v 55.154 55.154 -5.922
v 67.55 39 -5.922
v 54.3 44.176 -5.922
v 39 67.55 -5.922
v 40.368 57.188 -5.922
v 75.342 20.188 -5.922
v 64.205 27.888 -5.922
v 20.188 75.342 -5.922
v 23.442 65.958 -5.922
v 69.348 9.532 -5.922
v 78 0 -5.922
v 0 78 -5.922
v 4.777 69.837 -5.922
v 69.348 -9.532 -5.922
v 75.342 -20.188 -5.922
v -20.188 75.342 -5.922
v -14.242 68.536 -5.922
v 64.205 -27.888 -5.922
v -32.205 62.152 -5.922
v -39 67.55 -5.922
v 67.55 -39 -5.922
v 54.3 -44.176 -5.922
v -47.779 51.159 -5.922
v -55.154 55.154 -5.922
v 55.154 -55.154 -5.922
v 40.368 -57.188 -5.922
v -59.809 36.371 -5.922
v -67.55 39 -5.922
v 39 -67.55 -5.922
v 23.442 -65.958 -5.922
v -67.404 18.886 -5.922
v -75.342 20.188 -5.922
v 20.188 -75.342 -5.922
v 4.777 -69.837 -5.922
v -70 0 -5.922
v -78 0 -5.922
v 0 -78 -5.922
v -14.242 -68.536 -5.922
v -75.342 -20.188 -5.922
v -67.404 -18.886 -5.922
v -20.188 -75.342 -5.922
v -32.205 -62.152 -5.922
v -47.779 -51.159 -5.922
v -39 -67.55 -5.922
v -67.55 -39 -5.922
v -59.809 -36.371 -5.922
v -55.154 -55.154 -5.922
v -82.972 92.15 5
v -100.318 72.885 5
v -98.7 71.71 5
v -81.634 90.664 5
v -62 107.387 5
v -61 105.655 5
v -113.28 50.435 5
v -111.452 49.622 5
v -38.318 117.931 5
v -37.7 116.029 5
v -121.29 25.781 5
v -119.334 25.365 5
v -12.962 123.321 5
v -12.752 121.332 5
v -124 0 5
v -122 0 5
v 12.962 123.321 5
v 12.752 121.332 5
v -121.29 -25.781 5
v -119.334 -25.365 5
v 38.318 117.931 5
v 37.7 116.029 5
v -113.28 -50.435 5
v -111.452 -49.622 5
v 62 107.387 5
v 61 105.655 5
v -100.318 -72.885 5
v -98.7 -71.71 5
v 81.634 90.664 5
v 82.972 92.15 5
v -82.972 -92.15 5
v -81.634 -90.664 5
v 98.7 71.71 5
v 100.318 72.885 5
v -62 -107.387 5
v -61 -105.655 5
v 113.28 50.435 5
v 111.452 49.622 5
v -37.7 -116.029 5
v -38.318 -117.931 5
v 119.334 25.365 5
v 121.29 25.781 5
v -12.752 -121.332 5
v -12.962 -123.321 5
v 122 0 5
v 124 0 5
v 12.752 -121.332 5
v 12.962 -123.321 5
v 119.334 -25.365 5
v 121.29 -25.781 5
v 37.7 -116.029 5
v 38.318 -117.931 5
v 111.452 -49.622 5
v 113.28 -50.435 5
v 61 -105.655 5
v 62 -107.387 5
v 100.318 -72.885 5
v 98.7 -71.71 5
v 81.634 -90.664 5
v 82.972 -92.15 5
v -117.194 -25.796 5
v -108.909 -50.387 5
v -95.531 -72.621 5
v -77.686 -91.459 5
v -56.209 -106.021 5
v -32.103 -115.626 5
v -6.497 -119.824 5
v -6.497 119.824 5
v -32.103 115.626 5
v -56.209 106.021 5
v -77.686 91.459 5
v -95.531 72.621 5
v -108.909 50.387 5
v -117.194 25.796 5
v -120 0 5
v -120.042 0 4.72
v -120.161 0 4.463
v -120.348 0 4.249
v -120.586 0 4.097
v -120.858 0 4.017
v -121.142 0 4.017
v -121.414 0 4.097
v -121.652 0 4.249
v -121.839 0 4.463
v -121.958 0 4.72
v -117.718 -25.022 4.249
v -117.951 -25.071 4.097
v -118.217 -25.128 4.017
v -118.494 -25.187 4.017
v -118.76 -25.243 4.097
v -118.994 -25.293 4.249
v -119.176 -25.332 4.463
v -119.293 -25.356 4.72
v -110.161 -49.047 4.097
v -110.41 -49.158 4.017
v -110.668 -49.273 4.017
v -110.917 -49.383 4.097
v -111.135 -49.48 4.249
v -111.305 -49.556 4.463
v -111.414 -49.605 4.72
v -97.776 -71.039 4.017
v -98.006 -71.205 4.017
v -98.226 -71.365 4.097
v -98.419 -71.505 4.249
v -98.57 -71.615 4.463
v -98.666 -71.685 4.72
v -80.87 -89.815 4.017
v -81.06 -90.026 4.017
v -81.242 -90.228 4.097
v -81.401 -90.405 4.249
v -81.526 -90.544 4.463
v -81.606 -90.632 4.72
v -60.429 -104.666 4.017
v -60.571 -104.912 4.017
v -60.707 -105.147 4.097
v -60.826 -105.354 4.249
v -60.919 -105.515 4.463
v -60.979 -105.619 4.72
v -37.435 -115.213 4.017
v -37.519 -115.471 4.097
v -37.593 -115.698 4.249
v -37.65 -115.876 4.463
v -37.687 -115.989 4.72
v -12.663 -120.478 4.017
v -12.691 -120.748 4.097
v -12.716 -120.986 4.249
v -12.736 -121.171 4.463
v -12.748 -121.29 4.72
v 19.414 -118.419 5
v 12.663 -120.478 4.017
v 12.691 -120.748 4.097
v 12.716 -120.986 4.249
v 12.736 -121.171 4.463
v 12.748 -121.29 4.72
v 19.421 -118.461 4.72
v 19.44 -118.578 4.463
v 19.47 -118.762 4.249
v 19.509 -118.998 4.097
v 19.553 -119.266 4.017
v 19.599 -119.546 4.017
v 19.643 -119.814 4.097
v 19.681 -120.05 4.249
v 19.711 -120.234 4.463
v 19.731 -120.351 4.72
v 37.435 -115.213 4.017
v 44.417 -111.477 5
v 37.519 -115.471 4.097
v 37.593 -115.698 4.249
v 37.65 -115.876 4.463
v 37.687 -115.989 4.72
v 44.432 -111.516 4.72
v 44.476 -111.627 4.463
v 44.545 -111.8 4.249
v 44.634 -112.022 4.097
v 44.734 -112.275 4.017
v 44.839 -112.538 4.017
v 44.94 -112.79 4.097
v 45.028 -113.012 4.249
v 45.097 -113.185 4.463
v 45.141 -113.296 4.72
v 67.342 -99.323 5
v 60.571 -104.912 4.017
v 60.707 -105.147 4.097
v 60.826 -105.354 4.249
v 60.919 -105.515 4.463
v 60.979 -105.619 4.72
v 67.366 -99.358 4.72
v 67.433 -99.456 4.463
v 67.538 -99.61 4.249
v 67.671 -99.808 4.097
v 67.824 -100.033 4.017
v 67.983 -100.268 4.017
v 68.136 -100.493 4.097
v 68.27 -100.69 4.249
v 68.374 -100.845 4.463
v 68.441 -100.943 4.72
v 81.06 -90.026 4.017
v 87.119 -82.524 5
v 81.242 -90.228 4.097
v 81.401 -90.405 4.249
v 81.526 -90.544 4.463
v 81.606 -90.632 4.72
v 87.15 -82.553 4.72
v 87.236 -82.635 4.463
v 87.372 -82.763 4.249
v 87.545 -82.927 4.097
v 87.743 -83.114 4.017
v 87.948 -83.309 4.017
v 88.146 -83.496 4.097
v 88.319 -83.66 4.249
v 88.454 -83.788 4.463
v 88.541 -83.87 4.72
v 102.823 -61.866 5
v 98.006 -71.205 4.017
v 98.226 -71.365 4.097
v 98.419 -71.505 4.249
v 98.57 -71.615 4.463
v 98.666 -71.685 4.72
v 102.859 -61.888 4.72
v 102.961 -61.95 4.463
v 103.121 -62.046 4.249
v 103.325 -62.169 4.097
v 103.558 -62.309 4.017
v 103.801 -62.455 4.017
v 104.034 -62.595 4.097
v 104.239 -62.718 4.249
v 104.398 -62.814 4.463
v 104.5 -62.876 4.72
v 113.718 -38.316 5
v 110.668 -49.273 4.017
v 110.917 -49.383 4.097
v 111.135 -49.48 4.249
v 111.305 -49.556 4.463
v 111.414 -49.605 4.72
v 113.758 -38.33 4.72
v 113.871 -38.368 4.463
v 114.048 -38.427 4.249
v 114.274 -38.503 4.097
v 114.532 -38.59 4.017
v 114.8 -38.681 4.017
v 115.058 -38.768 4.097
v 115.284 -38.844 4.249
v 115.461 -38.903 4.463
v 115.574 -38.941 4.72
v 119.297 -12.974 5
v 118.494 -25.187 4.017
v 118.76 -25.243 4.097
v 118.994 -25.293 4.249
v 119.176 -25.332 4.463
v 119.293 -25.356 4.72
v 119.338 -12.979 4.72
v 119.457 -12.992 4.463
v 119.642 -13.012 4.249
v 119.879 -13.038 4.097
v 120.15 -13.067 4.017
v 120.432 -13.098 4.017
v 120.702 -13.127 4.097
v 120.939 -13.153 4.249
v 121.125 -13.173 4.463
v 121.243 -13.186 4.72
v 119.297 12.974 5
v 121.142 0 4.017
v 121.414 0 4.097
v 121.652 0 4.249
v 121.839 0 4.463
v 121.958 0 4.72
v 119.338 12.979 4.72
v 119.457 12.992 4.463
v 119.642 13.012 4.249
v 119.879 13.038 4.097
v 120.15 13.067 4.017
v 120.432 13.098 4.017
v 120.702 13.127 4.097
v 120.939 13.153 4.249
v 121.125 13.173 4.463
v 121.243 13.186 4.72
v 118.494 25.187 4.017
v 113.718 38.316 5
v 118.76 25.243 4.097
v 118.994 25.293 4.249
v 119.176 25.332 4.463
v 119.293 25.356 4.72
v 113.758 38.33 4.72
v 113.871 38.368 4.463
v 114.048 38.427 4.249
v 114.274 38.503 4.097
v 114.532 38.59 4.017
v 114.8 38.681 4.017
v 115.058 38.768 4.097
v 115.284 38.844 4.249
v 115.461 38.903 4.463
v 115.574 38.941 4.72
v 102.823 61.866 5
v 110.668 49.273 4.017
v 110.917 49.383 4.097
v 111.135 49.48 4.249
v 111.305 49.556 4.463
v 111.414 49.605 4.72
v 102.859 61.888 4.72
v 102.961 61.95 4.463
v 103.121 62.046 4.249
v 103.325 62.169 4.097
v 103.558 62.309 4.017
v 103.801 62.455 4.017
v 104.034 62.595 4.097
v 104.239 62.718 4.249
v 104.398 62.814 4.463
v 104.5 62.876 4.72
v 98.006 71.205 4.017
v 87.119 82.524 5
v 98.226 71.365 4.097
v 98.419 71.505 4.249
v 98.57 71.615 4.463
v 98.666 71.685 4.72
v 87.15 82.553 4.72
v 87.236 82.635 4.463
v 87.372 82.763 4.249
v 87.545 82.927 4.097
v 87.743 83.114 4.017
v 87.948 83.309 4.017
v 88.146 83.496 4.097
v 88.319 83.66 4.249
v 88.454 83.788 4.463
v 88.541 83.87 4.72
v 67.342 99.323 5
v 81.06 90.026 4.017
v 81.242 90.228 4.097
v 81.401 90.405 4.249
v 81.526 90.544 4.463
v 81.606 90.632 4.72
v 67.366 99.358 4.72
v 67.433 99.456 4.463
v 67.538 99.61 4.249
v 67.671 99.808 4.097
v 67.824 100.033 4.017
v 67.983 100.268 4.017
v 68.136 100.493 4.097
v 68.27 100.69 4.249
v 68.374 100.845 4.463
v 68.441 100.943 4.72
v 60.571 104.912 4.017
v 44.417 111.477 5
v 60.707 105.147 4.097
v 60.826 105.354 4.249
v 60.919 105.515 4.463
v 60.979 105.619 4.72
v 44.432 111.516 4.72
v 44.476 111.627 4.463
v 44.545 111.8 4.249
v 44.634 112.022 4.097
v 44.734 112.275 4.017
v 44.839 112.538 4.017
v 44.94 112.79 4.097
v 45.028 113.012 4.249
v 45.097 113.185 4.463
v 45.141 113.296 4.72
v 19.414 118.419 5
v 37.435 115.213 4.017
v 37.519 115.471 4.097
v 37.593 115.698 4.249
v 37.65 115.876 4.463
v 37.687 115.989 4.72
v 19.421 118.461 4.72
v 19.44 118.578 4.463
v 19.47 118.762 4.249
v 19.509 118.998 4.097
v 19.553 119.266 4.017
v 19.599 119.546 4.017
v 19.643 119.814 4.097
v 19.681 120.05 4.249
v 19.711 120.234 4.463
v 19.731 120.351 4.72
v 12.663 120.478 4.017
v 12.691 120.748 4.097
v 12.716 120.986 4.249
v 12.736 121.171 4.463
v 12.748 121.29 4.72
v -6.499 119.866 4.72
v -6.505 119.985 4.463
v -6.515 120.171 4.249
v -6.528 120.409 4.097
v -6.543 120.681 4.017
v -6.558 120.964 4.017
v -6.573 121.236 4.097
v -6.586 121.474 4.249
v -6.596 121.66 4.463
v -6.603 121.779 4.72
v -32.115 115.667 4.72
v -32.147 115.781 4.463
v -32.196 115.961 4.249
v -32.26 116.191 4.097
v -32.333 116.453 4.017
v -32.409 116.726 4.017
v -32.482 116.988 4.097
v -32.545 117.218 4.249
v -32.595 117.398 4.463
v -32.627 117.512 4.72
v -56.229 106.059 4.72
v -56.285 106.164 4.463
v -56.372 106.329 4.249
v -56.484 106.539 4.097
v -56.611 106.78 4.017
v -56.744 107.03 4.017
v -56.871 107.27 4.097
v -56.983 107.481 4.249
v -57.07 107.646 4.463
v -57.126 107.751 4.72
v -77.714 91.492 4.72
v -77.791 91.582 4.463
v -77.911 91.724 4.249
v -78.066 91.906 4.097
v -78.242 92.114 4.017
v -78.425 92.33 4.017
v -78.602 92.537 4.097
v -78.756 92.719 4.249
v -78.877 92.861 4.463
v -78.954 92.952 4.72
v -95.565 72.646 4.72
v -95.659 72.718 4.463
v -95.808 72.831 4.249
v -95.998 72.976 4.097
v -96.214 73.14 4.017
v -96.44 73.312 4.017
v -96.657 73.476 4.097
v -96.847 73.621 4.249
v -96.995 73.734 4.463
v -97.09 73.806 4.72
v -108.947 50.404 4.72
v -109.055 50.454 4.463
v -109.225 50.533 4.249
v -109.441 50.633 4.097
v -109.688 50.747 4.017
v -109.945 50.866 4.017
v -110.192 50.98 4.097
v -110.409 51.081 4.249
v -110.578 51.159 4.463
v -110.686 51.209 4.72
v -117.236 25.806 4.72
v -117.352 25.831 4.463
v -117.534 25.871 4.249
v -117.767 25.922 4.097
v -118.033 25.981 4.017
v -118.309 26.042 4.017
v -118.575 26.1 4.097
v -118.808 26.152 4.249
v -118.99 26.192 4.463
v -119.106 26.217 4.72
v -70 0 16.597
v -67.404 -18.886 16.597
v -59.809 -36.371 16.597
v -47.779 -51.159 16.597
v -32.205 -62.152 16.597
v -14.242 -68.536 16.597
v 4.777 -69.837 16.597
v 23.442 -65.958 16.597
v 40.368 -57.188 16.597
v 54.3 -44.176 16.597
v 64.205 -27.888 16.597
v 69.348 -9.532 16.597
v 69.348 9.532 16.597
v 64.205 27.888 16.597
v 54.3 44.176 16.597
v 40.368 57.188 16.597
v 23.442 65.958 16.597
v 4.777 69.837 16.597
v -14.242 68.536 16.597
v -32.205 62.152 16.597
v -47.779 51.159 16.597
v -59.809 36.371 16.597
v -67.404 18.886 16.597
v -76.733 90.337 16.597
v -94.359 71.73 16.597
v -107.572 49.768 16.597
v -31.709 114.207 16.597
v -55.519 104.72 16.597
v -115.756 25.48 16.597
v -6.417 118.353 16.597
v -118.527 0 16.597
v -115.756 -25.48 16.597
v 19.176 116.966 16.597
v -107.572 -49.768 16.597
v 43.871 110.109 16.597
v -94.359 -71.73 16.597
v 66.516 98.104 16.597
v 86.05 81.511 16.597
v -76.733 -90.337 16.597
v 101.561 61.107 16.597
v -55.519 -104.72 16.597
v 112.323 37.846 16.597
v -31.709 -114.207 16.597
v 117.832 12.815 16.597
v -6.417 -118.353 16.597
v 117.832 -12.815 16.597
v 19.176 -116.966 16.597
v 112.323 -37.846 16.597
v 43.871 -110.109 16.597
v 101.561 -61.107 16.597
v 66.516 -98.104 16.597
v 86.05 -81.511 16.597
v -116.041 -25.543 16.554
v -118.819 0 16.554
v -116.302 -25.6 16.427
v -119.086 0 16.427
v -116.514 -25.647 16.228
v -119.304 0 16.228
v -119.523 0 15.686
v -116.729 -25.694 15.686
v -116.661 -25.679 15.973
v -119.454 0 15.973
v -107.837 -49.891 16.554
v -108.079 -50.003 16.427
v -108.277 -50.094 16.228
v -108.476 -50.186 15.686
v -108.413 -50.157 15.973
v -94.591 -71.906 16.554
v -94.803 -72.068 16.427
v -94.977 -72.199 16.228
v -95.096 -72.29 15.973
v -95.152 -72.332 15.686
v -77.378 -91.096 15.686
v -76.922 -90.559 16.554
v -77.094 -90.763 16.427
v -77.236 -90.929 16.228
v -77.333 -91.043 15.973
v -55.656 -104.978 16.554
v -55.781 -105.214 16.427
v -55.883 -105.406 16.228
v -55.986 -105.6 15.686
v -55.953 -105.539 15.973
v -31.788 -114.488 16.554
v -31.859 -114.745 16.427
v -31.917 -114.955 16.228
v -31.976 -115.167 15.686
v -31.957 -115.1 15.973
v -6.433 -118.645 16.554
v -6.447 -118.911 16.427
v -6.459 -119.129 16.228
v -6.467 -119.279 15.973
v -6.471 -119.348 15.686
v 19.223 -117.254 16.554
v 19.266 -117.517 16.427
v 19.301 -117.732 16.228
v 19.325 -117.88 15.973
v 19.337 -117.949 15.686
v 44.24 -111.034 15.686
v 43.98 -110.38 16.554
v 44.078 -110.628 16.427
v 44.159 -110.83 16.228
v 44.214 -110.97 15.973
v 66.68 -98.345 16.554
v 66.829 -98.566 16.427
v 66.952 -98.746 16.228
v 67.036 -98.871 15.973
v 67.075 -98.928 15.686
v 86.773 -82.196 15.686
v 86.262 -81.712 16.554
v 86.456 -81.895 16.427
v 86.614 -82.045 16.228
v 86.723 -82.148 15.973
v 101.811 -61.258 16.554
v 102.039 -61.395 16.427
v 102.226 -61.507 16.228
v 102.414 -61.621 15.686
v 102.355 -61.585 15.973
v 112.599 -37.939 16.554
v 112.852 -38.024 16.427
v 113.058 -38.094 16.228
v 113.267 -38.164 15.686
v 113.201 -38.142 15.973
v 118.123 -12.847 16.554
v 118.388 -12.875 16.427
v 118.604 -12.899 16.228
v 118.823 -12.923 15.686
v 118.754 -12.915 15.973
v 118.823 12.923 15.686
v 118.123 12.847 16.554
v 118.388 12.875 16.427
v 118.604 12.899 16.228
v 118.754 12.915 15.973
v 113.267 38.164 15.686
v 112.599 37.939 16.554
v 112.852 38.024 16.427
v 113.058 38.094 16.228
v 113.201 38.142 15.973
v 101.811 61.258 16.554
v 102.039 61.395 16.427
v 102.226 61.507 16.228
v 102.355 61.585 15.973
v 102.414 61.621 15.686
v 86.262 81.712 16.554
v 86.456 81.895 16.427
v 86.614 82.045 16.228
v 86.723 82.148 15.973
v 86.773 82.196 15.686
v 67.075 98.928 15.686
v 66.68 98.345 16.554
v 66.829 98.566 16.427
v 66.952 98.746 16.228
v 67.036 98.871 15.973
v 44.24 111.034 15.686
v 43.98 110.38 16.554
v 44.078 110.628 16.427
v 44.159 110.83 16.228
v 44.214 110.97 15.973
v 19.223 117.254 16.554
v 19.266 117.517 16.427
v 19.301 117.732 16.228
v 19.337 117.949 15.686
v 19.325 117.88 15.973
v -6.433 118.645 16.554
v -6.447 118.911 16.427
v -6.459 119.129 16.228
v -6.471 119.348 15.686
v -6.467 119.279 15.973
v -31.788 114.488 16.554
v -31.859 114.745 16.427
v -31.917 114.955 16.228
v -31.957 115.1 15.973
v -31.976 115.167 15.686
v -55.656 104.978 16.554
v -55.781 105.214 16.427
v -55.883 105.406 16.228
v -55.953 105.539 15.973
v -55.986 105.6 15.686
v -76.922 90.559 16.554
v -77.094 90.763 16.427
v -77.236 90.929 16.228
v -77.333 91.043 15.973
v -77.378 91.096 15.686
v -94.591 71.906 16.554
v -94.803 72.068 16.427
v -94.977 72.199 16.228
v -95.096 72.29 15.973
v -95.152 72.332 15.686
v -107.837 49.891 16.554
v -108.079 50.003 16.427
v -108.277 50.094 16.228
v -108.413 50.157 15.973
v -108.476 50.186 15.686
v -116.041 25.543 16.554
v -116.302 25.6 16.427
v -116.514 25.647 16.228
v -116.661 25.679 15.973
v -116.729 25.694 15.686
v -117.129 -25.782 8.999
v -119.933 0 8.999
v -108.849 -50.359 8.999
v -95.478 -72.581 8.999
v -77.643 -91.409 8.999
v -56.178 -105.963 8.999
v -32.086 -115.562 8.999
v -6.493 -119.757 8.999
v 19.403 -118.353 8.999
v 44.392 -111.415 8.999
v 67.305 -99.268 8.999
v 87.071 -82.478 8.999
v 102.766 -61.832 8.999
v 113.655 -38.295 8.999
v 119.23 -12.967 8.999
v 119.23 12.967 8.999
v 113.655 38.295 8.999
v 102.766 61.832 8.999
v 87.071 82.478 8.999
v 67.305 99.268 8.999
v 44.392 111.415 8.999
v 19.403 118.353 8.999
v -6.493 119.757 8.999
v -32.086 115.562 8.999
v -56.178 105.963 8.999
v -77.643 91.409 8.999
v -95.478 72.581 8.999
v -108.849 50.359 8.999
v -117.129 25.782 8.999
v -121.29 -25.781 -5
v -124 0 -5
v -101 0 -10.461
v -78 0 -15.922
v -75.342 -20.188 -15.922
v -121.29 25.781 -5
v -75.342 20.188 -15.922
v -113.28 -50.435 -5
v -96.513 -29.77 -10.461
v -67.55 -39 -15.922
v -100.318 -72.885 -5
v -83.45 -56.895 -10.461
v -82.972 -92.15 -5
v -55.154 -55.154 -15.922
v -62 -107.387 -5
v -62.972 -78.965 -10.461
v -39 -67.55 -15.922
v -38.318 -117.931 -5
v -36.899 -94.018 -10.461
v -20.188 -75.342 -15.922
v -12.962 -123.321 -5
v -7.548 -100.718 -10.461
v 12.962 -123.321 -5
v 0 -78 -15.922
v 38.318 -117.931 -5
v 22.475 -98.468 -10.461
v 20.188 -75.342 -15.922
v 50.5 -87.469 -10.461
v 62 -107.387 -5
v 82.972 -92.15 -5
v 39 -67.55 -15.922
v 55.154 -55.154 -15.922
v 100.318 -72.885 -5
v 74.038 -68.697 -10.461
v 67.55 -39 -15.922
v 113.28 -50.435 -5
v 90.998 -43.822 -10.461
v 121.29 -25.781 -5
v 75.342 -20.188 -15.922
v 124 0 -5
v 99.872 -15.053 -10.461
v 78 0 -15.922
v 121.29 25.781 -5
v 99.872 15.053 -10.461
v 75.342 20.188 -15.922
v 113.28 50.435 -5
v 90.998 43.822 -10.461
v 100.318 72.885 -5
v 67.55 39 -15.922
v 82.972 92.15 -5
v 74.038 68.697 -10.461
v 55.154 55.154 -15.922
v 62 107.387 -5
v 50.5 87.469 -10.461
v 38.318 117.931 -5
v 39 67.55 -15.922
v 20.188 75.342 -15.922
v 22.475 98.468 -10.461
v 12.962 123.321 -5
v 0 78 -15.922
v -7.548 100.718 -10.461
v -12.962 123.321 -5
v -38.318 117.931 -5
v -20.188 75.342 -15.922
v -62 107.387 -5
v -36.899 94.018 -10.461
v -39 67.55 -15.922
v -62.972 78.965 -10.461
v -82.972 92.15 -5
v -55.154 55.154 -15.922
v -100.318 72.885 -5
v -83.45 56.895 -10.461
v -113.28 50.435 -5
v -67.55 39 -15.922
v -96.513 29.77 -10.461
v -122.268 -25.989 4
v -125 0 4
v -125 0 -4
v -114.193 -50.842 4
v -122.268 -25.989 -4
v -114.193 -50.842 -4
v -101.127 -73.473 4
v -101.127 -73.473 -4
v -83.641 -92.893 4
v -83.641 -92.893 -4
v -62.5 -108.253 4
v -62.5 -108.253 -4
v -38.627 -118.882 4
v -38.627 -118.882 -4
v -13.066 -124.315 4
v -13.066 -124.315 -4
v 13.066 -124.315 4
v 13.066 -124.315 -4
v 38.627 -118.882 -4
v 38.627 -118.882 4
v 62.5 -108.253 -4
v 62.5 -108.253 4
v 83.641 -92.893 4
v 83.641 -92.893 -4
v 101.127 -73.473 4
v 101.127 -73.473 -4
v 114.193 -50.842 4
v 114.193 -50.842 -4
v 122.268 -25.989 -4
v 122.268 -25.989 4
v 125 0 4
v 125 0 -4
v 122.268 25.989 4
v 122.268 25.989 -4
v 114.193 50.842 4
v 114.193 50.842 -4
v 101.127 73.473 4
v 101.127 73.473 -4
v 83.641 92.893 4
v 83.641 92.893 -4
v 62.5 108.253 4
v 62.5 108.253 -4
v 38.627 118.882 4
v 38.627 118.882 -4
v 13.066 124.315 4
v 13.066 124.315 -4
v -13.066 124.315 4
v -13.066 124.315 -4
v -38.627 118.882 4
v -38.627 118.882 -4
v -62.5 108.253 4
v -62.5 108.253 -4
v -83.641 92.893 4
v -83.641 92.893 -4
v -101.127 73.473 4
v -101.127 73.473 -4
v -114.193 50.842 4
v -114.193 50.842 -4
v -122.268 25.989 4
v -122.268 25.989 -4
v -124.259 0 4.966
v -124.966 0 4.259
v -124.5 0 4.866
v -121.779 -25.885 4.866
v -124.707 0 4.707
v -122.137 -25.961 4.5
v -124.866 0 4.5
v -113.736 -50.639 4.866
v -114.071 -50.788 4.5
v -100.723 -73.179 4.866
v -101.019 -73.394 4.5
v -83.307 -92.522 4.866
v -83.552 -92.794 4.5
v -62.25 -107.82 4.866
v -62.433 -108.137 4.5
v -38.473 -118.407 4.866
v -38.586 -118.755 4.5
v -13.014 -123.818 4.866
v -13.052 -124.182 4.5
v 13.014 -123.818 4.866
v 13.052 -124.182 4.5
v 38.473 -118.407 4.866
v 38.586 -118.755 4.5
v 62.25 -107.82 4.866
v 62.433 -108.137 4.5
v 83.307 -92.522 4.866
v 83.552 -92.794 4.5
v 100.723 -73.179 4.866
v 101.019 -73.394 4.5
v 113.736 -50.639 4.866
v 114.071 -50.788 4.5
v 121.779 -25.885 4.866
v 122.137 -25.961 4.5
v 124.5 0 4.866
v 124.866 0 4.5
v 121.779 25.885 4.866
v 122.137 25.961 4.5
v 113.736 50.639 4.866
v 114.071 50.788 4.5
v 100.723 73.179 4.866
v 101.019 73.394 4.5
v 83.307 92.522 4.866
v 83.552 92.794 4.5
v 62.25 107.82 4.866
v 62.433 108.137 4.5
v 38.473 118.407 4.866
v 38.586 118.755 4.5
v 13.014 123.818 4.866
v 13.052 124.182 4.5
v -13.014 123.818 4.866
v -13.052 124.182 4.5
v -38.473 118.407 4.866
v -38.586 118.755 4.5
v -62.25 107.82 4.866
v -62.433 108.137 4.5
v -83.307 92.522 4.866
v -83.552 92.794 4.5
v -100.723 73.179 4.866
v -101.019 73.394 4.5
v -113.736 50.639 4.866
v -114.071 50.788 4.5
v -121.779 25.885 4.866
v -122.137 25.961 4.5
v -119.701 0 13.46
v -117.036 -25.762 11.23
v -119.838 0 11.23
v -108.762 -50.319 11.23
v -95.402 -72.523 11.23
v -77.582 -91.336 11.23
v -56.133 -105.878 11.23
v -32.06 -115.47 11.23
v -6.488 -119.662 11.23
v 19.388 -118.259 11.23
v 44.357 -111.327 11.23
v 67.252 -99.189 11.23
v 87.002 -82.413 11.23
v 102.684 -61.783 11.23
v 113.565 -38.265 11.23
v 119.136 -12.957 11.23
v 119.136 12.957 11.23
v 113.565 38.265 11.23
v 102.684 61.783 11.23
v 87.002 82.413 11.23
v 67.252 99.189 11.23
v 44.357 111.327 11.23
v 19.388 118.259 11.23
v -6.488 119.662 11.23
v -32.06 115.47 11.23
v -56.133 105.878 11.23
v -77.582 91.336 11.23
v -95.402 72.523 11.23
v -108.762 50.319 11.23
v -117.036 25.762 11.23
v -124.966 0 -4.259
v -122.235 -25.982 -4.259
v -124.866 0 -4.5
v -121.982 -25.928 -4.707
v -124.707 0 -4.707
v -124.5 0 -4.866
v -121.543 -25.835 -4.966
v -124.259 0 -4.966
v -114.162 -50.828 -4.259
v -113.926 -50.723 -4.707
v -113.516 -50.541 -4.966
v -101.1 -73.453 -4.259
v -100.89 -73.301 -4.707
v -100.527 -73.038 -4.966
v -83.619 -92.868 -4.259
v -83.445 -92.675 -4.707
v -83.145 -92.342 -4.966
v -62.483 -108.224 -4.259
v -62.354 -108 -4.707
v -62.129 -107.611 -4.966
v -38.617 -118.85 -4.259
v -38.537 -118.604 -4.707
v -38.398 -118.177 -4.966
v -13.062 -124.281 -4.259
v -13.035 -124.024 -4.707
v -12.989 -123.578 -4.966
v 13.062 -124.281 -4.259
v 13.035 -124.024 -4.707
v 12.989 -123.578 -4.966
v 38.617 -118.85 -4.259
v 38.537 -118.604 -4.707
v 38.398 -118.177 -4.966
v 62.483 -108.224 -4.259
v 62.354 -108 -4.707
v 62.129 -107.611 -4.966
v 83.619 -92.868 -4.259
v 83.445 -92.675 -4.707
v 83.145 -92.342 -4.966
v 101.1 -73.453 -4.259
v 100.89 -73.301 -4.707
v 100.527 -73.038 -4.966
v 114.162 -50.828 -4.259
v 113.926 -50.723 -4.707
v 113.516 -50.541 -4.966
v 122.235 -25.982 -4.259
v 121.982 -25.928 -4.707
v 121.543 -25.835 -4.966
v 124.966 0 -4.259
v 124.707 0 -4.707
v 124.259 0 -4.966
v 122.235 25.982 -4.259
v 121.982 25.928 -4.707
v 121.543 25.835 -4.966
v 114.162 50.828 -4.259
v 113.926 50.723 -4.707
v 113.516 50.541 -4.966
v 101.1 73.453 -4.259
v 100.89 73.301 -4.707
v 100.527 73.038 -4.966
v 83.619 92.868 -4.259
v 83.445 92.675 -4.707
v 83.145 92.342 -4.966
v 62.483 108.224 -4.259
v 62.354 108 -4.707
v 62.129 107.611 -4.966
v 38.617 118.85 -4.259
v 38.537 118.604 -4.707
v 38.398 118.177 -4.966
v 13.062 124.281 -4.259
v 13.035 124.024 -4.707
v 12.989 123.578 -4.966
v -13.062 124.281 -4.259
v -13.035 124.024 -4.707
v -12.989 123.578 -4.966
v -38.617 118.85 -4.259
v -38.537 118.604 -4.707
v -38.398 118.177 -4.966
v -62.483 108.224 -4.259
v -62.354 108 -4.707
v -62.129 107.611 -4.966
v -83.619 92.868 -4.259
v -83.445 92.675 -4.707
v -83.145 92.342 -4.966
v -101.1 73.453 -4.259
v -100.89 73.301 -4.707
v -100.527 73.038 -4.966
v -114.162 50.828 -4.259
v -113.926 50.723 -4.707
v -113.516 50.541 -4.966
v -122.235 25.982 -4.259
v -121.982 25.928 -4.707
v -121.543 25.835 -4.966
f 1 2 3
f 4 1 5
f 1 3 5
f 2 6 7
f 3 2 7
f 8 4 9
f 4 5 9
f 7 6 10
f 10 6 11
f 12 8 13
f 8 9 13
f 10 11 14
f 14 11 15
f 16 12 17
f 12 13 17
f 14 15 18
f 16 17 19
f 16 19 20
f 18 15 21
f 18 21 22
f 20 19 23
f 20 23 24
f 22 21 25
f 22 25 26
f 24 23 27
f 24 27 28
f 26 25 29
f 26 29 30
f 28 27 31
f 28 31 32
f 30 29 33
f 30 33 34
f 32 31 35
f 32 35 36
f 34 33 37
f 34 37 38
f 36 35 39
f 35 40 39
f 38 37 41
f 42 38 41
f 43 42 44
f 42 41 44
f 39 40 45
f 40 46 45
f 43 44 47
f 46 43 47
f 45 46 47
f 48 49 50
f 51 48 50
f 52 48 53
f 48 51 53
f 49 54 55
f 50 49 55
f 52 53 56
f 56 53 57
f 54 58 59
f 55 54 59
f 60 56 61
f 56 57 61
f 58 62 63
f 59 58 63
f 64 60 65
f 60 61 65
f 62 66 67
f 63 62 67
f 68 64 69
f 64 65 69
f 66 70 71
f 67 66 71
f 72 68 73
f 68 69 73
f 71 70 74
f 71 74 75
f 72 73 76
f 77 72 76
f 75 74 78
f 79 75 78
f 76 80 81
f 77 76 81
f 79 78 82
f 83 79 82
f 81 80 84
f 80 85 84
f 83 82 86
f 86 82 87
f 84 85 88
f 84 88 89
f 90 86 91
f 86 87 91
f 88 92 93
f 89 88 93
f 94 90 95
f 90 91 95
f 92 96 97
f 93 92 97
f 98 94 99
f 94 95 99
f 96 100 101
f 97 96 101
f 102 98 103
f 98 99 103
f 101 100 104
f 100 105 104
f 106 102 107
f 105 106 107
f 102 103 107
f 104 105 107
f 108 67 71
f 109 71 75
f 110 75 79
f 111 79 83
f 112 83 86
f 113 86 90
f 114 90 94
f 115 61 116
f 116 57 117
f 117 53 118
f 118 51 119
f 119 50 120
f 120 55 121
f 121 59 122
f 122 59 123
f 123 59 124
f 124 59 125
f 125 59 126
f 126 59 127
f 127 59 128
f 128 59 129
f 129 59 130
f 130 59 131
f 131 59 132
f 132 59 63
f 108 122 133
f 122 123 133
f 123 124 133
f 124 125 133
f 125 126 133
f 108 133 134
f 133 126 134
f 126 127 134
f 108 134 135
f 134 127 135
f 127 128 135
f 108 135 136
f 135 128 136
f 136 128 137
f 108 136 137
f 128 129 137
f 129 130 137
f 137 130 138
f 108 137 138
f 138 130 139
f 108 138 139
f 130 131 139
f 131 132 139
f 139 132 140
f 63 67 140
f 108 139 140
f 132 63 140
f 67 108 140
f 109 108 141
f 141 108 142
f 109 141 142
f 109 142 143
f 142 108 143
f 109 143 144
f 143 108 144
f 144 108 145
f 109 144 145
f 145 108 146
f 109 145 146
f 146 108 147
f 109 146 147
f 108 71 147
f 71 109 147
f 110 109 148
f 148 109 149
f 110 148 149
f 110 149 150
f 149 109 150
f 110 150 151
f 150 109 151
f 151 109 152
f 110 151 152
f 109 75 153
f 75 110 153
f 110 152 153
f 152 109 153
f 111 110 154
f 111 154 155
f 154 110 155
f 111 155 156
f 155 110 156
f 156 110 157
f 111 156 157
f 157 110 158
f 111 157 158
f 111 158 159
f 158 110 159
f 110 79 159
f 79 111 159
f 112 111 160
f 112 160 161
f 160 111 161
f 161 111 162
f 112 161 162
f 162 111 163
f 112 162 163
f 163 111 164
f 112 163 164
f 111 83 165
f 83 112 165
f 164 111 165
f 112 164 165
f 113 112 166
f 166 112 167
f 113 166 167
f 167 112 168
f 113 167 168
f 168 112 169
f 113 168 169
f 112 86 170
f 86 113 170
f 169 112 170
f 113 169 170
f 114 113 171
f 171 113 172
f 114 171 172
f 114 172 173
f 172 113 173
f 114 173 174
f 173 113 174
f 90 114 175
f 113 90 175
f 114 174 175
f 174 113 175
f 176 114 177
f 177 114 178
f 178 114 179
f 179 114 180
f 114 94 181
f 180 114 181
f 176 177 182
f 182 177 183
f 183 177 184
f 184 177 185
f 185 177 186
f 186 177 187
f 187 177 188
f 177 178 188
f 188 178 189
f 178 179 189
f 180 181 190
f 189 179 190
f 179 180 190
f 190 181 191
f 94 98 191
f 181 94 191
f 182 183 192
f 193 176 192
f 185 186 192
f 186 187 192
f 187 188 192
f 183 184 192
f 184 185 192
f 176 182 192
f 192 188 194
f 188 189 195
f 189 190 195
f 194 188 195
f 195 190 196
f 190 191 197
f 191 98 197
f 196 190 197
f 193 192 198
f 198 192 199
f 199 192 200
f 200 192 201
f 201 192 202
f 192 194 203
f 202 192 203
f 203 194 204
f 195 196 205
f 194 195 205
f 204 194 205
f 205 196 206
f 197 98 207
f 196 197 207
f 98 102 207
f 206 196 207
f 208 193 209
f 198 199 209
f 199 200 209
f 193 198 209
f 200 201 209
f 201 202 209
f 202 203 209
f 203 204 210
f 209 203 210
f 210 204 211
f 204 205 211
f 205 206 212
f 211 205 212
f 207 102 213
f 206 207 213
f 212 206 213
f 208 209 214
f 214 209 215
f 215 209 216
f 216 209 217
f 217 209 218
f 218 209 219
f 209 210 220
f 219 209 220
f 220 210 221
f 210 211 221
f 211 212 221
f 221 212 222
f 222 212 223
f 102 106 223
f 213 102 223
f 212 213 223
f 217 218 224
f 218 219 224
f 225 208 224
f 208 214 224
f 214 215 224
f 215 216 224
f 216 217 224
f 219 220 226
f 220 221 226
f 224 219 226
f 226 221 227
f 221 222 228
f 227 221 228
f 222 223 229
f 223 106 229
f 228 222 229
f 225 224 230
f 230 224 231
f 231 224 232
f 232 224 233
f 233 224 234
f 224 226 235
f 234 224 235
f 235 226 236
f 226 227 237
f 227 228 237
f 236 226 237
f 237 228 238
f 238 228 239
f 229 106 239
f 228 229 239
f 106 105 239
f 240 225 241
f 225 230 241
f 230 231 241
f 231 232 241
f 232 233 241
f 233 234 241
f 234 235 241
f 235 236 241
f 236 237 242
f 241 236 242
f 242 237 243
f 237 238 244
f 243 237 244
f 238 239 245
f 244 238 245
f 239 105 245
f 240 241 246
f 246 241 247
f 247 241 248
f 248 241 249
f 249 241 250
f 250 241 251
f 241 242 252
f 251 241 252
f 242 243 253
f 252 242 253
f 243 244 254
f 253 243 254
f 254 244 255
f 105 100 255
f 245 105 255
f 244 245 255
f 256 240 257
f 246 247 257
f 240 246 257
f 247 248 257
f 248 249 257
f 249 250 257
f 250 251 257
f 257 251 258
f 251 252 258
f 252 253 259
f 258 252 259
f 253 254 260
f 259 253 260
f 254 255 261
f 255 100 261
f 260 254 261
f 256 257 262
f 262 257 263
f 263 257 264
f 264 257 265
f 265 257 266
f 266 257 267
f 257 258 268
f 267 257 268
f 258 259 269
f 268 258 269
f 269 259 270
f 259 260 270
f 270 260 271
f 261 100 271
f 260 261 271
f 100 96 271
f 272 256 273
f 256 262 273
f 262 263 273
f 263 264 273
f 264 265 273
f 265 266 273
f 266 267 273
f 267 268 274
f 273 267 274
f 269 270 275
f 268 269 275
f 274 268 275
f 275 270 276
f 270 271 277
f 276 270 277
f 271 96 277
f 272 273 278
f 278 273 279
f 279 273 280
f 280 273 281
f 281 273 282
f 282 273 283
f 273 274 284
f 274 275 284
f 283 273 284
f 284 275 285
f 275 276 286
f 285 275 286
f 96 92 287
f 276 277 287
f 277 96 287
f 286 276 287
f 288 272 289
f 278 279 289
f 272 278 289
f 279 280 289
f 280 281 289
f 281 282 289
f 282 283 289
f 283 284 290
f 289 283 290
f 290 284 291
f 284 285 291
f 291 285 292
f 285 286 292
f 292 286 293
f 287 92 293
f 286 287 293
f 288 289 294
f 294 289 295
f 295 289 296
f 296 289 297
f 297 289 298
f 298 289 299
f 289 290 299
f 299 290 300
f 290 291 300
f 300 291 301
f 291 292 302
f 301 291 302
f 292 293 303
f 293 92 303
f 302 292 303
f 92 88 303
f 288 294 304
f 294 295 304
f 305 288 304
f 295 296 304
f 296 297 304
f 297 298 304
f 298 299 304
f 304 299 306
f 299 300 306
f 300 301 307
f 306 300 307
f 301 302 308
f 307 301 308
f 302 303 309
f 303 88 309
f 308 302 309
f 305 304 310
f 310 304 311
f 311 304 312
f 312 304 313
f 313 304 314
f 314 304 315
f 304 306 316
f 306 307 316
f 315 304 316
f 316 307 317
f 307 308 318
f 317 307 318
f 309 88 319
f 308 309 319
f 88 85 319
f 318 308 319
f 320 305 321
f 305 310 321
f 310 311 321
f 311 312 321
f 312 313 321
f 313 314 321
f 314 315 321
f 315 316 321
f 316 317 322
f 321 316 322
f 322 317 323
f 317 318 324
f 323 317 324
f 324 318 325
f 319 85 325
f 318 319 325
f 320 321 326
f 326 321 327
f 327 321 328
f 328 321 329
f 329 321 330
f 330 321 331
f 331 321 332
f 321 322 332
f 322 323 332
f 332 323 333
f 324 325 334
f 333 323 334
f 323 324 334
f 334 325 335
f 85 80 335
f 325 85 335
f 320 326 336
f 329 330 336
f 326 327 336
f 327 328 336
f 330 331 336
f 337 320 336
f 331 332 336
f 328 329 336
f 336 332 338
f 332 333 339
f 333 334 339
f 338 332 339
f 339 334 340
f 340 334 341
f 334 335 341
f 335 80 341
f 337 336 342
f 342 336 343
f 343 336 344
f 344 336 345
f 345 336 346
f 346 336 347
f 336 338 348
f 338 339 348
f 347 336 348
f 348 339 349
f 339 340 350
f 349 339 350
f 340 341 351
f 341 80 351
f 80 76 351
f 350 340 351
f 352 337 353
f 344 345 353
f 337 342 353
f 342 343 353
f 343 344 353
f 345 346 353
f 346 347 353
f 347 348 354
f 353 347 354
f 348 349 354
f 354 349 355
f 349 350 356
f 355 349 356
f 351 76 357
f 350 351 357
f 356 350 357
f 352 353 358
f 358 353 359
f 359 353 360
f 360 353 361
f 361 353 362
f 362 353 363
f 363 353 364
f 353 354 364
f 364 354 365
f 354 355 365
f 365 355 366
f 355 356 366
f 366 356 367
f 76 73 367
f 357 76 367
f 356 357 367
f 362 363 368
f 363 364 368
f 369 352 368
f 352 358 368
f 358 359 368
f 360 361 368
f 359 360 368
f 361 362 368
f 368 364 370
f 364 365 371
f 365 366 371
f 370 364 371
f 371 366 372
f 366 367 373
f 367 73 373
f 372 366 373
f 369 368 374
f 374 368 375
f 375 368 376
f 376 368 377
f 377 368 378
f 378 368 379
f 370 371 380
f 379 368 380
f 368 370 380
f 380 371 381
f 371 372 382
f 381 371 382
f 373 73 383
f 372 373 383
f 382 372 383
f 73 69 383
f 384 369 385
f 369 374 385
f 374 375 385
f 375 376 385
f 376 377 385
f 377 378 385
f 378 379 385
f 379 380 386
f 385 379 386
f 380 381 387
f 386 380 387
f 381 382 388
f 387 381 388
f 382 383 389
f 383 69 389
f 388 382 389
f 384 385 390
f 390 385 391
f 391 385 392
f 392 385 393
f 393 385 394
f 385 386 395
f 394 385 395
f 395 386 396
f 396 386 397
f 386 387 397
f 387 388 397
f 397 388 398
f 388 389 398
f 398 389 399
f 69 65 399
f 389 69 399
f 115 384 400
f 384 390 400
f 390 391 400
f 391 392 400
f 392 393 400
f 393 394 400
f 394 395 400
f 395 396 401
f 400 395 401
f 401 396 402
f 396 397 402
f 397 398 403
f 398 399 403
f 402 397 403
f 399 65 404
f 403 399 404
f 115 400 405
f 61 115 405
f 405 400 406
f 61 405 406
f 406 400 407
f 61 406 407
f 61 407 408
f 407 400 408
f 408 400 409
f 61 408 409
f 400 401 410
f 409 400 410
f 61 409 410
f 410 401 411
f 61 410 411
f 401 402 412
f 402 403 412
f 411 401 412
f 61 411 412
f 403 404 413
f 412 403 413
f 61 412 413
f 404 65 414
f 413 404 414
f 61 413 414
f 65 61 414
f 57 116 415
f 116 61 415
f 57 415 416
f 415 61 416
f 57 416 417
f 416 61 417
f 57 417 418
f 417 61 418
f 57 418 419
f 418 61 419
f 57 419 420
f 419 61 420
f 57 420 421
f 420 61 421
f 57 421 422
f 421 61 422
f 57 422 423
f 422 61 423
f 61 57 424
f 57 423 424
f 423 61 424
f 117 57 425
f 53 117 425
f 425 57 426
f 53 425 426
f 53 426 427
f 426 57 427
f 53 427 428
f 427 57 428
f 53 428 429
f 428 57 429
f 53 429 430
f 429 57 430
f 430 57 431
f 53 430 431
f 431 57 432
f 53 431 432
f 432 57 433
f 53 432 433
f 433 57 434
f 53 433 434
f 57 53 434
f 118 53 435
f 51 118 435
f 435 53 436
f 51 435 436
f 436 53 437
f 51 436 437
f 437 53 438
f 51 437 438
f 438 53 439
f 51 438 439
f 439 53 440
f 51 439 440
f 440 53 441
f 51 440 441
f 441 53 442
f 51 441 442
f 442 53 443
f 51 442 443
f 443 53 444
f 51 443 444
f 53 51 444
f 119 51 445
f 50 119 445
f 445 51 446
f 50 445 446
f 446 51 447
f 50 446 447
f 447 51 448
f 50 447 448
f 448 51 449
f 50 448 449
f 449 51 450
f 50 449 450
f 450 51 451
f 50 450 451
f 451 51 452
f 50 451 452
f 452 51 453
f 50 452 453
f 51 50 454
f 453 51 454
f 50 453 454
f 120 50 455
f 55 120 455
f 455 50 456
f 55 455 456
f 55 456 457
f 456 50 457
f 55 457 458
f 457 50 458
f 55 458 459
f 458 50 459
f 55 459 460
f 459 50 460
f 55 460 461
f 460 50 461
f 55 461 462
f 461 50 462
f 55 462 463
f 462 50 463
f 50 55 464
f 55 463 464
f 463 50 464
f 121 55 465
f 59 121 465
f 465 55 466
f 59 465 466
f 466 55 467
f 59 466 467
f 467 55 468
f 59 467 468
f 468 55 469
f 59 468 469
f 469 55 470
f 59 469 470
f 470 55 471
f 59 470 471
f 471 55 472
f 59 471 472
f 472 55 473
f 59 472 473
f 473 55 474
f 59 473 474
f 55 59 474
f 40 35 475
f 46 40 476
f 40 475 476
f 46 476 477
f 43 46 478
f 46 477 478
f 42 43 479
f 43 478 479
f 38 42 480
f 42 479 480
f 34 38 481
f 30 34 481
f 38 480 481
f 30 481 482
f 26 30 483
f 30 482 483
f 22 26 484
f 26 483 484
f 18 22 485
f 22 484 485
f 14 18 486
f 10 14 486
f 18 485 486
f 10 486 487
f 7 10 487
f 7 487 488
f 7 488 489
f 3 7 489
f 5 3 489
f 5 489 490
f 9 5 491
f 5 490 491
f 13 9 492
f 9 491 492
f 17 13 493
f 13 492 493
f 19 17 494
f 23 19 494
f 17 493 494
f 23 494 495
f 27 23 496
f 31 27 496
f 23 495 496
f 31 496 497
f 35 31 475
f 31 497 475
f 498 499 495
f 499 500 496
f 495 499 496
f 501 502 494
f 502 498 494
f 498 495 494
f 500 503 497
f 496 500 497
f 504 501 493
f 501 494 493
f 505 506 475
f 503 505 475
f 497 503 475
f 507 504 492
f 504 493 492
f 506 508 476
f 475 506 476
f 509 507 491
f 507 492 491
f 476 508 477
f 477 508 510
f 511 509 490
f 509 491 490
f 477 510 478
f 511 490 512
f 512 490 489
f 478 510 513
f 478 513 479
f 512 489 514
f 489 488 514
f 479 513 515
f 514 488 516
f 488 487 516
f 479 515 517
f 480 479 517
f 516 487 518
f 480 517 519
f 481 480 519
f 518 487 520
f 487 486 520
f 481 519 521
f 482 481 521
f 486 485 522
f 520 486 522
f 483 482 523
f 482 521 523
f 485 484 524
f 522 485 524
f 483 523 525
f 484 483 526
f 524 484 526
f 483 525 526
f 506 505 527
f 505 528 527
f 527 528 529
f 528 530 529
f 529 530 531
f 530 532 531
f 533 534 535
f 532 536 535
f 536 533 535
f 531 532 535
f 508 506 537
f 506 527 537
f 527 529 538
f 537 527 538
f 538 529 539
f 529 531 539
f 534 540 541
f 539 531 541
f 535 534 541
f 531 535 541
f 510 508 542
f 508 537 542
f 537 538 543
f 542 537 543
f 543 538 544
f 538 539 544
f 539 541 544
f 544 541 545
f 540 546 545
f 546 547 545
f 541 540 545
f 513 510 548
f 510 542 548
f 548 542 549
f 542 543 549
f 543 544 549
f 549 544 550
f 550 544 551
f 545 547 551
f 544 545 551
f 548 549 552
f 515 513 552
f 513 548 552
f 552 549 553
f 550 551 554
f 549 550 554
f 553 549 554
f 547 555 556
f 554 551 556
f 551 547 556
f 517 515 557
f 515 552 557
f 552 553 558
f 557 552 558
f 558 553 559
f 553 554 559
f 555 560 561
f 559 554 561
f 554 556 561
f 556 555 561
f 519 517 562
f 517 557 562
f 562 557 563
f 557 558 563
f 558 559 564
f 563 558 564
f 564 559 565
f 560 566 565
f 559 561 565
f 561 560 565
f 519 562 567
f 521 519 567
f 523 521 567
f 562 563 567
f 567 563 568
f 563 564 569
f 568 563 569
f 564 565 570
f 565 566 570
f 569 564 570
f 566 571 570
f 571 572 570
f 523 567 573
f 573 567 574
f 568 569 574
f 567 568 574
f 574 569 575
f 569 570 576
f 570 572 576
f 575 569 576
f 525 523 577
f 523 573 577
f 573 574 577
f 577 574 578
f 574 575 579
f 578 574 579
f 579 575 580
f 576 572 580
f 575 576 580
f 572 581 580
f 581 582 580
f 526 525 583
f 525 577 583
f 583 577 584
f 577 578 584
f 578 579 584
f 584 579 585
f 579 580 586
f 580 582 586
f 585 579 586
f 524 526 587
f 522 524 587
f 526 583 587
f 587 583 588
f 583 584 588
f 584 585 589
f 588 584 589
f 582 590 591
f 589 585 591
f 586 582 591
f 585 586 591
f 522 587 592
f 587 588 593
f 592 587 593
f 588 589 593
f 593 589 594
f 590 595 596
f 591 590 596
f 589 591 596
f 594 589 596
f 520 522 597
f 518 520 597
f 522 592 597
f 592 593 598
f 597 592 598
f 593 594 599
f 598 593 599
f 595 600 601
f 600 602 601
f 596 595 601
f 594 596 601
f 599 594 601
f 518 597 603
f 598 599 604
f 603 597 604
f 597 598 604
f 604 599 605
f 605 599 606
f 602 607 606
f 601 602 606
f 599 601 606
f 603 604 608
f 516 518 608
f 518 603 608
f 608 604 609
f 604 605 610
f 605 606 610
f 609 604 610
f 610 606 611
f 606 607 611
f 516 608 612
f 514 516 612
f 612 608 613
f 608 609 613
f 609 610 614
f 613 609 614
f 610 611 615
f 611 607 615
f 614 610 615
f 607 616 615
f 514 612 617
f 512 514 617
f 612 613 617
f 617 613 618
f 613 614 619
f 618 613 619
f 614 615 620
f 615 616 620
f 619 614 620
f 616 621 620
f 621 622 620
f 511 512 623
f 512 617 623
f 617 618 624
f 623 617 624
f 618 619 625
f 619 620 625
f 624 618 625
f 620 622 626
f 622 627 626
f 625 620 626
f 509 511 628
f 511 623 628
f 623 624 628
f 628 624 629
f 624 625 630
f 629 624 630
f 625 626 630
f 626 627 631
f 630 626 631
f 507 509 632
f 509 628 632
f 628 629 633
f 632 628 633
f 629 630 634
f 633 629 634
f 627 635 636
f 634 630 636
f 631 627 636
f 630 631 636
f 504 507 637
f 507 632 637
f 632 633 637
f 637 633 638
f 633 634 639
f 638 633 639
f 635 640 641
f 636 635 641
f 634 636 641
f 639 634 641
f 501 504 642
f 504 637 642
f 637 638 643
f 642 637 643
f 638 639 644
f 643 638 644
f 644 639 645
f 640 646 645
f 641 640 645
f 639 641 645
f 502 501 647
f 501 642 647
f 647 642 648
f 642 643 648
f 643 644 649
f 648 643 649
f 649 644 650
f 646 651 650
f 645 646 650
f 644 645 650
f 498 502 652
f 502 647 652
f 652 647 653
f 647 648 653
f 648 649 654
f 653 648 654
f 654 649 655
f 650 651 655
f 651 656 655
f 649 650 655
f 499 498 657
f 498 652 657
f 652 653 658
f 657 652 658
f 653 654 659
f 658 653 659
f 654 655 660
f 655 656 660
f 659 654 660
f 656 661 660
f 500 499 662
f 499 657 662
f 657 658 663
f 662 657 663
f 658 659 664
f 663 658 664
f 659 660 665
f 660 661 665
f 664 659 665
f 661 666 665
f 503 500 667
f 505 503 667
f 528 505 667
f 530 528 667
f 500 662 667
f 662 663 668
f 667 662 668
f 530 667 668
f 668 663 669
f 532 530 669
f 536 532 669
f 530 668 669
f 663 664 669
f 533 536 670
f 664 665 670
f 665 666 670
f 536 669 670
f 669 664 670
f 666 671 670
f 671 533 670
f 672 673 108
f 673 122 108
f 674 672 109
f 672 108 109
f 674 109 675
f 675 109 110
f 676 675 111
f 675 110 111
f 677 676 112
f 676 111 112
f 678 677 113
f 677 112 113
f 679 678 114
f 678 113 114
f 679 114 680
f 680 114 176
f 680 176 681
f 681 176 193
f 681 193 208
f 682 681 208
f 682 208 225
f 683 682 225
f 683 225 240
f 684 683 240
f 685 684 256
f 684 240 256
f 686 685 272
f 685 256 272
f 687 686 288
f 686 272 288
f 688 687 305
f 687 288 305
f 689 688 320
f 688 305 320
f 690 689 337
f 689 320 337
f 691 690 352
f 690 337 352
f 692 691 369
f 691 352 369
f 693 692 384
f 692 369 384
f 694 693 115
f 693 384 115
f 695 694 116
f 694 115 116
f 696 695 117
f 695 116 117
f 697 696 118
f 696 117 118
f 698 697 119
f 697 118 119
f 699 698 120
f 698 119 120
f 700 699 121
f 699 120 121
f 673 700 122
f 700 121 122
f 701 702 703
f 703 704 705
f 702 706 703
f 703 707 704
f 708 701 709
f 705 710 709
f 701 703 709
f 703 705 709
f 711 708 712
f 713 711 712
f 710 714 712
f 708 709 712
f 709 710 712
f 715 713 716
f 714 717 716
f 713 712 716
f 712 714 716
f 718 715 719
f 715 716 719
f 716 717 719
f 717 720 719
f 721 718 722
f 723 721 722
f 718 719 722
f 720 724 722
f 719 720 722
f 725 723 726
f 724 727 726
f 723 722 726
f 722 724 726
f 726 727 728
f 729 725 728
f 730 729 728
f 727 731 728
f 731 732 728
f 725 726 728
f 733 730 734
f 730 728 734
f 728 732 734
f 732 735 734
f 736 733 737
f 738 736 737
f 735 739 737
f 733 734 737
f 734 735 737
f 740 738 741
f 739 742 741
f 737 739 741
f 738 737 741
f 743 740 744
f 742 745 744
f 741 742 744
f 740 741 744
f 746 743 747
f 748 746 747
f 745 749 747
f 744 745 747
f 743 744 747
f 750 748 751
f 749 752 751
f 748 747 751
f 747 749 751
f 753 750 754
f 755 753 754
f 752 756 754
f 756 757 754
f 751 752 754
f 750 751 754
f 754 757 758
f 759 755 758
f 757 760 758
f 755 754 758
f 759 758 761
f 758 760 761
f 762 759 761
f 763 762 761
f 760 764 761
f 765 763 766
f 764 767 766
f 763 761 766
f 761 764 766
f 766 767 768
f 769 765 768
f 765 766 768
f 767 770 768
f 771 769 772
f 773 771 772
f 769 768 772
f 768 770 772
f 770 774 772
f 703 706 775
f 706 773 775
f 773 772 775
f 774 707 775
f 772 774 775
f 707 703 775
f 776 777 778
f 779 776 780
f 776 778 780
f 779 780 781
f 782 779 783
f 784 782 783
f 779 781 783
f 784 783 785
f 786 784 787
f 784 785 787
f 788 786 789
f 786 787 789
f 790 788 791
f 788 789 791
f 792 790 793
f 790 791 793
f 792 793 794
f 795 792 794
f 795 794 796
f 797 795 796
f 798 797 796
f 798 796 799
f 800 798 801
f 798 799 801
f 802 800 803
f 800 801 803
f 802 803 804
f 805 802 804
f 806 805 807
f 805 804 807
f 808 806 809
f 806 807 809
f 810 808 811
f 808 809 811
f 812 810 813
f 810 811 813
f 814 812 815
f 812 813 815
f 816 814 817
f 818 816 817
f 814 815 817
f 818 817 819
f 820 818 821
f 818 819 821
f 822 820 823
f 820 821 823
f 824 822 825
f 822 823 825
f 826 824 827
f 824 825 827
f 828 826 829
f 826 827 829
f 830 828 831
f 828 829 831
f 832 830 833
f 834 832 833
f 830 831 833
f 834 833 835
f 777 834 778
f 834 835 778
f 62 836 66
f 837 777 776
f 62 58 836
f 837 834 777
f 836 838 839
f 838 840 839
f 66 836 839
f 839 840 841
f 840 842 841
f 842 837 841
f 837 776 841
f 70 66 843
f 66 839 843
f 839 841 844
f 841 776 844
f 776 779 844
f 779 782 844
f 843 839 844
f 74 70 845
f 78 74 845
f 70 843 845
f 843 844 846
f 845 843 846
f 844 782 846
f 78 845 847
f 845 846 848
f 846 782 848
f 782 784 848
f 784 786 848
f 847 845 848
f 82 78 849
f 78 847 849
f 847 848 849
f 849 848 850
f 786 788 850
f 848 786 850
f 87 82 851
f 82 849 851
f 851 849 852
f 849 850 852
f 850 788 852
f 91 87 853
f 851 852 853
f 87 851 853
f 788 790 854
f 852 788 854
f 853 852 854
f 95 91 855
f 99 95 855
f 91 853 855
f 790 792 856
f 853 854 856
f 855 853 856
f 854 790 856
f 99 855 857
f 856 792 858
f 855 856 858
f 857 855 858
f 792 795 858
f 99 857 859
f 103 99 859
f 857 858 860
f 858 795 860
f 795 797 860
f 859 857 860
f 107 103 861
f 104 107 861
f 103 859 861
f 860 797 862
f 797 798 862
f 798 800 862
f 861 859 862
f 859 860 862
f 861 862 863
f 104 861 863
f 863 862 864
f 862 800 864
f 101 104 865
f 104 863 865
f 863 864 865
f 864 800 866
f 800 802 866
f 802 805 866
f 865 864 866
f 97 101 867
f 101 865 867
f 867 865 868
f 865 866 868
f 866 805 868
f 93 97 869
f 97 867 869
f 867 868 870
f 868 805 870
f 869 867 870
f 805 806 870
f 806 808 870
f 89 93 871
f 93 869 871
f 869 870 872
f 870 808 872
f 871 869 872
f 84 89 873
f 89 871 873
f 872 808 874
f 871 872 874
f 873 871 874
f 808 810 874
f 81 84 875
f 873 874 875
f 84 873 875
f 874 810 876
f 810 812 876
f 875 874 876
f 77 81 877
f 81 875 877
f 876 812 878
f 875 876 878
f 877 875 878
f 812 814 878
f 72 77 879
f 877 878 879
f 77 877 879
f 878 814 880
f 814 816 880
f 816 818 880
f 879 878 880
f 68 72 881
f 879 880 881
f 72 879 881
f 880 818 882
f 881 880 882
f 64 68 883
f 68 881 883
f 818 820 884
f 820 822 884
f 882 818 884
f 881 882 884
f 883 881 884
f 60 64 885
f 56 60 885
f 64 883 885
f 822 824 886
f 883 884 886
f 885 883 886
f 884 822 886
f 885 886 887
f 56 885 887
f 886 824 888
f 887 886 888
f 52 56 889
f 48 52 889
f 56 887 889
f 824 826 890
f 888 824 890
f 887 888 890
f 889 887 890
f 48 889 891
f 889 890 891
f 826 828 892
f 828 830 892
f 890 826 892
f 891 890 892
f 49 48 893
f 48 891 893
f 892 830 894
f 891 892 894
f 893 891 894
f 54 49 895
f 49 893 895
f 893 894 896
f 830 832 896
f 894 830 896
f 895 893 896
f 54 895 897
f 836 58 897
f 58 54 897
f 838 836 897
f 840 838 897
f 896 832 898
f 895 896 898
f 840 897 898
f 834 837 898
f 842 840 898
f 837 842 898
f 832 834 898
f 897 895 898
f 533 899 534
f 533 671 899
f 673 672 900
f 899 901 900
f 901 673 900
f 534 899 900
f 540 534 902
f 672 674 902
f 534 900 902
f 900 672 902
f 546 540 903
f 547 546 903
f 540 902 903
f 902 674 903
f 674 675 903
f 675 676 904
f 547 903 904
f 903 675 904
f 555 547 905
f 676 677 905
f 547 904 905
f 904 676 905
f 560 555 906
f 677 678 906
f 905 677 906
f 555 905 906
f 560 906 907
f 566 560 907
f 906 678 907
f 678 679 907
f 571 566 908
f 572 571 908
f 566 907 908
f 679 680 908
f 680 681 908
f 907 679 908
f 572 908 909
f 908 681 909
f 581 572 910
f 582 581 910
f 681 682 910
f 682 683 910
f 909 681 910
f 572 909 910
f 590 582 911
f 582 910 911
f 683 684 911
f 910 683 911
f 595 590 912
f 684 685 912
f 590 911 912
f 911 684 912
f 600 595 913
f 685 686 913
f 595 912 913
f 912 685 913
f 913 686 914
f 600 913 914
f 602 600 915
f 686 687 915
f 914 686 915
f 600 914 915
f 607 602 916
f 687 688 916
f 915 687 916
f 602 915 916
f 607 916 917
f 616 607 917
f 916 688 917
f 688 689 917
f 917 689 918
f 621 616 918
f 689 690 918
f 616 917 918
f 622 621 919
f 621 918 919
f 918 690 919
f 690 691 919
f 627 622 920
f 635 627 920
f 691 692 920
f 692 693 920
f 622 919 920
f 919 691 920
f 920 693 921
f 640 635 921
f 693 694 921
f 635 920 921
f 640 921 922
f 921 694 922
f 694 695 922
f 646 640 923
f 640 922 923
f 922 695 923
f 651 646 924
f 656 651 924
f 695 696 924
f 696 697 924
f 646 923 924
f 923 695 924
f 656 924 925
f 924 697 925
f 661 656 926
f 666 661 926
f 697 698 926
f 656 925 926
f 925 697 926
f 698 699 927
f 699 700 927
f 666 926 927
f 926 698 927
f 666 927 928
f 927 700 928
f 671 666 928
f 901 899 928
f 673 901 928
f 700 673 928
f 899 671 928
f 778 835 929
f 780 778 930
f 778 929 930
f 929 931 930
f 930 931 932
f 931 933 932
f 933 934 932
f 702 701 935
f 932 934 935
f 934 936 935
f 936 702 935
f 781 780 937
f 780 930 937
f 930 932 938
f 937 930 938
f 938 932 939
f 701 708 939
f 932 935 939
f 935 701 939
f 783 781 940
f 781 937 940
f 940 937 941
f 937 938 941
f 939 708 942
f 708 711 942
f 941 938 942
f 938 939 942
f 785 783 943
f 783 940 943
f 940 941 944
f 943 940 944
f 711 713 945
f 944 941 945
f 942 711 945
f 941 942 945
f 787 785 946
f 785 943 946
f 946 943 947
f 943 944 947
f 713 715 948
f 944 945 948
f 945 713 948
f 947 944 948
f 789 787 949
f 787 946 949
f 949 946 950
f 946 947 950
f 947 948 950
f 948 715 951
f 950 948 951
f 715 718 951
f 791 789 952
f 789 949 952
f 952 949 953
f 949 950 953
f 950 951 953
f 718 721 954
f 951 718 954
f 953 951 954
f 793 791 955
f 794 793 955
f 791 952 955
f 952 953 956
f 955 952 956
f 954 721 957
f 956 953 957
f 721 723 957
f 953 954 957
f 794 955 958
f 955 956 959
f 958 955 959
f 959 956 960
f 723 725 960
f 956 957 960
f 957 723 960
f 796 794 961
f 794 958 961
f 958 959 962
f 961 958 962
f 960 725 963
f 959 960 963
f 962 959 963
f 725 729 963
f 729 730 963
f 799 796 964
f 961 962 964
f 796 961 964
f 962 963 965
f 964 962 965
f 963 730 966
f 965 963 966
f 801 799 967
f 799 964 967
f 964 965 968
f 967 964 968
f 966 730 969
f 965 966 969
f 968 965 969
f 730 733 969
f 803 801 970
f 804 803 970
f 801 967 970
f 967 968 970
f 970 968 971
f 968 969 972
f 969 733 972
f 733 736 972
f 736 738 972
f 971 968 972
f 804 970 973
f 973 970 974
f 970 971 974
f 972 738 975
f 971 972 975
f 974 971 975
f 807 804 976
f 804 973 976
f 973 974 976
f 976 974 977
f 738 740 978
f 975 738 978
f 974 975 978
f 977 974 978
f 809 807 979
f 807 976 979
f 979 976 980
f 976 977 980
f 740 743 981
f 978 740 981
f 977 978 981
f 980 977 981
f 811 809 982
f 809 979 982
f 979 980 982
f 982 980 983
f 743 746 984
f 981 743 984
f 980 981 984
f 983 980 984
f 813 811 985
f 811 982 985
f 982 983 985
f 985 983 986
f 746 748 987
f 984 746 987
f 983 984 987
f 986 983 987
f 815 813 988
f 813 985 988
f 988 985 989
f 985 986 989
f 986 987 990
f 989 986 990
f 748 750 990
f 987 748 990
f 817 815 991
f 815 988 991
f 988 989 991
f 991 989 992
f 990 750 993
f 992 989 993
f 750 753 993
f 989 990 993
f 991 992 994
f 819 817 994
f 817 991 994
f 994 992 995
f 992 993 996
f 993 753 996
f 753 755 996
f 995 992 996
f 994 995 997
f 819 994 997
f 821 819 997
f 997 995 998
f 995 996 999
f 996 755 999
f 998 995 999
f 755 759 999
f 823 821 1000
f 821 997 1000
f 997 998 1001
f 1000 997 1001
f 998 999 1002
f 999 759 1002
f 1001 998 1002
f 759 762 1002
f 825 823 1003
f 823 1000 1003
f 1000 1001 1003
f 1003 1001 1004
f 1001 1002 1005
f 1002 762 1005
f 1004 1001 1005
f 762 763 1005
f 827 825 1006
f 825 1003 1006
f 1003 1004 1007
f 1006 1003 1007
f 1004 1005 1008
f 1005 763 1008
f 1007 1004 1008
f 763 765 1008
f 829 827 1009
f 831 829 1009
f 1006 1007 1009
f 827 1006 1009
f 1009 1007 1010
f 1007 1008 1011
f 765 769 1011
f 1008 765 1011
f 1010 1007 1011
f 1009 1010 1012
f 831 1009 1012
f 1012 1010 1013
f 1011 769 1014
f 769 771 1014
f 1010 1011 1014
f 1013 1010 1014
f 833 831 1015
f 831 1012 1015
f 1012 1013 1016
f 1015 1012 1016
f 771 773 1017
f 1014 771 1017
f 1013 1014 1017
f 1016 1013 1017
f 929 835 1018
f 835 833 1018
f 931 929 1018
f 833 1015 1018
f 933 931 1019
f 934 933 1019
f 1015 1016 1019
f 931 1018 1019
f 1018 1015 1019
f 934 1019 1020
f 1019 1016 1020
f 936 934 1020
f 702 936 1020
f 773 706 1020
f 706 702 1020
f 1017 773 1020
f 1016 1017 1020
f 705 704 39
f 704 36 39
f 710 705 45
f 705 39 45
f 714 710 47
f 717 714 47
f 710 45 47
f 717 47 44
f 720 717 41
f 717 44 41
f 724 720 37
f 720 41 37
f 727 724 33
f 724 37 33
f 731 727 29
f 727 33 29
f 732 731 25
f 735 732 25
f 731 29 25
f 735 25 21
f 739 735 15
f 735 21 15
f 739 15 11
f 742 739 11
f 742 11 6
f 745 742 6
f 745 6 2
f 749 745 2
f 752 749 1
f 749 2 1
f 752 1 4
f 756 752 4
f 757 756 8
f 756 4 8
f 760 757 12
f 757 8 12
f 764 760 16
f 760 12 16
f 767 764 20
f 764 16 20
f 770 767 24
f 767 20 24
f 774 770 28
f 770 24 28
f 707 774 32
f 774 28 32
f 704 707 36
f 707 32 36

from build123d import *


with BuildPart() as f1:
    # F0 (on Front) → F1 (revolve)
    with BuildSketch(Plane.XZ):
        with BuildLine():
            ThreePointArc((-124, 5), (-124.707107, 4.707107), (-125, 4))
            Line((-125, 4), (-125, -4))
            ThreePointArc((-125, -4), (-124.707107, -4.707107), (-124, -5))
            Line((-124, -5), (-78, -15.922228))
            Line((-78, -15.922228), (-78, -5.922228))
            Line((-78, -5.922228), (-70, -5.922228))
            Line((-70, -5.922228), (-70, 16.597387))
            Line((-70, 16.597387), (-118.527193, 16.597387))
            ThreePointArc((-118.527193, 16.597387), (-119.202081, 16.335307), (-119.52322, 15.68644))
            ThreePointArc((-119.52322, 15.68644), (-119.77497, 12.345528), (-119.933352, 8.998889))
            Line((-119.933352, 8.998889), (-120, 5))
            ThreePointArc((-120, 5), (-120.999975, 4.007173), (-121.999949, 5))
            Line((-121.999949, 5), (-124, 5))
        make_face()
    revolve(axis=Axis((0, 0, 10.798693), (0, 0, 1)))


solid = f1.part
